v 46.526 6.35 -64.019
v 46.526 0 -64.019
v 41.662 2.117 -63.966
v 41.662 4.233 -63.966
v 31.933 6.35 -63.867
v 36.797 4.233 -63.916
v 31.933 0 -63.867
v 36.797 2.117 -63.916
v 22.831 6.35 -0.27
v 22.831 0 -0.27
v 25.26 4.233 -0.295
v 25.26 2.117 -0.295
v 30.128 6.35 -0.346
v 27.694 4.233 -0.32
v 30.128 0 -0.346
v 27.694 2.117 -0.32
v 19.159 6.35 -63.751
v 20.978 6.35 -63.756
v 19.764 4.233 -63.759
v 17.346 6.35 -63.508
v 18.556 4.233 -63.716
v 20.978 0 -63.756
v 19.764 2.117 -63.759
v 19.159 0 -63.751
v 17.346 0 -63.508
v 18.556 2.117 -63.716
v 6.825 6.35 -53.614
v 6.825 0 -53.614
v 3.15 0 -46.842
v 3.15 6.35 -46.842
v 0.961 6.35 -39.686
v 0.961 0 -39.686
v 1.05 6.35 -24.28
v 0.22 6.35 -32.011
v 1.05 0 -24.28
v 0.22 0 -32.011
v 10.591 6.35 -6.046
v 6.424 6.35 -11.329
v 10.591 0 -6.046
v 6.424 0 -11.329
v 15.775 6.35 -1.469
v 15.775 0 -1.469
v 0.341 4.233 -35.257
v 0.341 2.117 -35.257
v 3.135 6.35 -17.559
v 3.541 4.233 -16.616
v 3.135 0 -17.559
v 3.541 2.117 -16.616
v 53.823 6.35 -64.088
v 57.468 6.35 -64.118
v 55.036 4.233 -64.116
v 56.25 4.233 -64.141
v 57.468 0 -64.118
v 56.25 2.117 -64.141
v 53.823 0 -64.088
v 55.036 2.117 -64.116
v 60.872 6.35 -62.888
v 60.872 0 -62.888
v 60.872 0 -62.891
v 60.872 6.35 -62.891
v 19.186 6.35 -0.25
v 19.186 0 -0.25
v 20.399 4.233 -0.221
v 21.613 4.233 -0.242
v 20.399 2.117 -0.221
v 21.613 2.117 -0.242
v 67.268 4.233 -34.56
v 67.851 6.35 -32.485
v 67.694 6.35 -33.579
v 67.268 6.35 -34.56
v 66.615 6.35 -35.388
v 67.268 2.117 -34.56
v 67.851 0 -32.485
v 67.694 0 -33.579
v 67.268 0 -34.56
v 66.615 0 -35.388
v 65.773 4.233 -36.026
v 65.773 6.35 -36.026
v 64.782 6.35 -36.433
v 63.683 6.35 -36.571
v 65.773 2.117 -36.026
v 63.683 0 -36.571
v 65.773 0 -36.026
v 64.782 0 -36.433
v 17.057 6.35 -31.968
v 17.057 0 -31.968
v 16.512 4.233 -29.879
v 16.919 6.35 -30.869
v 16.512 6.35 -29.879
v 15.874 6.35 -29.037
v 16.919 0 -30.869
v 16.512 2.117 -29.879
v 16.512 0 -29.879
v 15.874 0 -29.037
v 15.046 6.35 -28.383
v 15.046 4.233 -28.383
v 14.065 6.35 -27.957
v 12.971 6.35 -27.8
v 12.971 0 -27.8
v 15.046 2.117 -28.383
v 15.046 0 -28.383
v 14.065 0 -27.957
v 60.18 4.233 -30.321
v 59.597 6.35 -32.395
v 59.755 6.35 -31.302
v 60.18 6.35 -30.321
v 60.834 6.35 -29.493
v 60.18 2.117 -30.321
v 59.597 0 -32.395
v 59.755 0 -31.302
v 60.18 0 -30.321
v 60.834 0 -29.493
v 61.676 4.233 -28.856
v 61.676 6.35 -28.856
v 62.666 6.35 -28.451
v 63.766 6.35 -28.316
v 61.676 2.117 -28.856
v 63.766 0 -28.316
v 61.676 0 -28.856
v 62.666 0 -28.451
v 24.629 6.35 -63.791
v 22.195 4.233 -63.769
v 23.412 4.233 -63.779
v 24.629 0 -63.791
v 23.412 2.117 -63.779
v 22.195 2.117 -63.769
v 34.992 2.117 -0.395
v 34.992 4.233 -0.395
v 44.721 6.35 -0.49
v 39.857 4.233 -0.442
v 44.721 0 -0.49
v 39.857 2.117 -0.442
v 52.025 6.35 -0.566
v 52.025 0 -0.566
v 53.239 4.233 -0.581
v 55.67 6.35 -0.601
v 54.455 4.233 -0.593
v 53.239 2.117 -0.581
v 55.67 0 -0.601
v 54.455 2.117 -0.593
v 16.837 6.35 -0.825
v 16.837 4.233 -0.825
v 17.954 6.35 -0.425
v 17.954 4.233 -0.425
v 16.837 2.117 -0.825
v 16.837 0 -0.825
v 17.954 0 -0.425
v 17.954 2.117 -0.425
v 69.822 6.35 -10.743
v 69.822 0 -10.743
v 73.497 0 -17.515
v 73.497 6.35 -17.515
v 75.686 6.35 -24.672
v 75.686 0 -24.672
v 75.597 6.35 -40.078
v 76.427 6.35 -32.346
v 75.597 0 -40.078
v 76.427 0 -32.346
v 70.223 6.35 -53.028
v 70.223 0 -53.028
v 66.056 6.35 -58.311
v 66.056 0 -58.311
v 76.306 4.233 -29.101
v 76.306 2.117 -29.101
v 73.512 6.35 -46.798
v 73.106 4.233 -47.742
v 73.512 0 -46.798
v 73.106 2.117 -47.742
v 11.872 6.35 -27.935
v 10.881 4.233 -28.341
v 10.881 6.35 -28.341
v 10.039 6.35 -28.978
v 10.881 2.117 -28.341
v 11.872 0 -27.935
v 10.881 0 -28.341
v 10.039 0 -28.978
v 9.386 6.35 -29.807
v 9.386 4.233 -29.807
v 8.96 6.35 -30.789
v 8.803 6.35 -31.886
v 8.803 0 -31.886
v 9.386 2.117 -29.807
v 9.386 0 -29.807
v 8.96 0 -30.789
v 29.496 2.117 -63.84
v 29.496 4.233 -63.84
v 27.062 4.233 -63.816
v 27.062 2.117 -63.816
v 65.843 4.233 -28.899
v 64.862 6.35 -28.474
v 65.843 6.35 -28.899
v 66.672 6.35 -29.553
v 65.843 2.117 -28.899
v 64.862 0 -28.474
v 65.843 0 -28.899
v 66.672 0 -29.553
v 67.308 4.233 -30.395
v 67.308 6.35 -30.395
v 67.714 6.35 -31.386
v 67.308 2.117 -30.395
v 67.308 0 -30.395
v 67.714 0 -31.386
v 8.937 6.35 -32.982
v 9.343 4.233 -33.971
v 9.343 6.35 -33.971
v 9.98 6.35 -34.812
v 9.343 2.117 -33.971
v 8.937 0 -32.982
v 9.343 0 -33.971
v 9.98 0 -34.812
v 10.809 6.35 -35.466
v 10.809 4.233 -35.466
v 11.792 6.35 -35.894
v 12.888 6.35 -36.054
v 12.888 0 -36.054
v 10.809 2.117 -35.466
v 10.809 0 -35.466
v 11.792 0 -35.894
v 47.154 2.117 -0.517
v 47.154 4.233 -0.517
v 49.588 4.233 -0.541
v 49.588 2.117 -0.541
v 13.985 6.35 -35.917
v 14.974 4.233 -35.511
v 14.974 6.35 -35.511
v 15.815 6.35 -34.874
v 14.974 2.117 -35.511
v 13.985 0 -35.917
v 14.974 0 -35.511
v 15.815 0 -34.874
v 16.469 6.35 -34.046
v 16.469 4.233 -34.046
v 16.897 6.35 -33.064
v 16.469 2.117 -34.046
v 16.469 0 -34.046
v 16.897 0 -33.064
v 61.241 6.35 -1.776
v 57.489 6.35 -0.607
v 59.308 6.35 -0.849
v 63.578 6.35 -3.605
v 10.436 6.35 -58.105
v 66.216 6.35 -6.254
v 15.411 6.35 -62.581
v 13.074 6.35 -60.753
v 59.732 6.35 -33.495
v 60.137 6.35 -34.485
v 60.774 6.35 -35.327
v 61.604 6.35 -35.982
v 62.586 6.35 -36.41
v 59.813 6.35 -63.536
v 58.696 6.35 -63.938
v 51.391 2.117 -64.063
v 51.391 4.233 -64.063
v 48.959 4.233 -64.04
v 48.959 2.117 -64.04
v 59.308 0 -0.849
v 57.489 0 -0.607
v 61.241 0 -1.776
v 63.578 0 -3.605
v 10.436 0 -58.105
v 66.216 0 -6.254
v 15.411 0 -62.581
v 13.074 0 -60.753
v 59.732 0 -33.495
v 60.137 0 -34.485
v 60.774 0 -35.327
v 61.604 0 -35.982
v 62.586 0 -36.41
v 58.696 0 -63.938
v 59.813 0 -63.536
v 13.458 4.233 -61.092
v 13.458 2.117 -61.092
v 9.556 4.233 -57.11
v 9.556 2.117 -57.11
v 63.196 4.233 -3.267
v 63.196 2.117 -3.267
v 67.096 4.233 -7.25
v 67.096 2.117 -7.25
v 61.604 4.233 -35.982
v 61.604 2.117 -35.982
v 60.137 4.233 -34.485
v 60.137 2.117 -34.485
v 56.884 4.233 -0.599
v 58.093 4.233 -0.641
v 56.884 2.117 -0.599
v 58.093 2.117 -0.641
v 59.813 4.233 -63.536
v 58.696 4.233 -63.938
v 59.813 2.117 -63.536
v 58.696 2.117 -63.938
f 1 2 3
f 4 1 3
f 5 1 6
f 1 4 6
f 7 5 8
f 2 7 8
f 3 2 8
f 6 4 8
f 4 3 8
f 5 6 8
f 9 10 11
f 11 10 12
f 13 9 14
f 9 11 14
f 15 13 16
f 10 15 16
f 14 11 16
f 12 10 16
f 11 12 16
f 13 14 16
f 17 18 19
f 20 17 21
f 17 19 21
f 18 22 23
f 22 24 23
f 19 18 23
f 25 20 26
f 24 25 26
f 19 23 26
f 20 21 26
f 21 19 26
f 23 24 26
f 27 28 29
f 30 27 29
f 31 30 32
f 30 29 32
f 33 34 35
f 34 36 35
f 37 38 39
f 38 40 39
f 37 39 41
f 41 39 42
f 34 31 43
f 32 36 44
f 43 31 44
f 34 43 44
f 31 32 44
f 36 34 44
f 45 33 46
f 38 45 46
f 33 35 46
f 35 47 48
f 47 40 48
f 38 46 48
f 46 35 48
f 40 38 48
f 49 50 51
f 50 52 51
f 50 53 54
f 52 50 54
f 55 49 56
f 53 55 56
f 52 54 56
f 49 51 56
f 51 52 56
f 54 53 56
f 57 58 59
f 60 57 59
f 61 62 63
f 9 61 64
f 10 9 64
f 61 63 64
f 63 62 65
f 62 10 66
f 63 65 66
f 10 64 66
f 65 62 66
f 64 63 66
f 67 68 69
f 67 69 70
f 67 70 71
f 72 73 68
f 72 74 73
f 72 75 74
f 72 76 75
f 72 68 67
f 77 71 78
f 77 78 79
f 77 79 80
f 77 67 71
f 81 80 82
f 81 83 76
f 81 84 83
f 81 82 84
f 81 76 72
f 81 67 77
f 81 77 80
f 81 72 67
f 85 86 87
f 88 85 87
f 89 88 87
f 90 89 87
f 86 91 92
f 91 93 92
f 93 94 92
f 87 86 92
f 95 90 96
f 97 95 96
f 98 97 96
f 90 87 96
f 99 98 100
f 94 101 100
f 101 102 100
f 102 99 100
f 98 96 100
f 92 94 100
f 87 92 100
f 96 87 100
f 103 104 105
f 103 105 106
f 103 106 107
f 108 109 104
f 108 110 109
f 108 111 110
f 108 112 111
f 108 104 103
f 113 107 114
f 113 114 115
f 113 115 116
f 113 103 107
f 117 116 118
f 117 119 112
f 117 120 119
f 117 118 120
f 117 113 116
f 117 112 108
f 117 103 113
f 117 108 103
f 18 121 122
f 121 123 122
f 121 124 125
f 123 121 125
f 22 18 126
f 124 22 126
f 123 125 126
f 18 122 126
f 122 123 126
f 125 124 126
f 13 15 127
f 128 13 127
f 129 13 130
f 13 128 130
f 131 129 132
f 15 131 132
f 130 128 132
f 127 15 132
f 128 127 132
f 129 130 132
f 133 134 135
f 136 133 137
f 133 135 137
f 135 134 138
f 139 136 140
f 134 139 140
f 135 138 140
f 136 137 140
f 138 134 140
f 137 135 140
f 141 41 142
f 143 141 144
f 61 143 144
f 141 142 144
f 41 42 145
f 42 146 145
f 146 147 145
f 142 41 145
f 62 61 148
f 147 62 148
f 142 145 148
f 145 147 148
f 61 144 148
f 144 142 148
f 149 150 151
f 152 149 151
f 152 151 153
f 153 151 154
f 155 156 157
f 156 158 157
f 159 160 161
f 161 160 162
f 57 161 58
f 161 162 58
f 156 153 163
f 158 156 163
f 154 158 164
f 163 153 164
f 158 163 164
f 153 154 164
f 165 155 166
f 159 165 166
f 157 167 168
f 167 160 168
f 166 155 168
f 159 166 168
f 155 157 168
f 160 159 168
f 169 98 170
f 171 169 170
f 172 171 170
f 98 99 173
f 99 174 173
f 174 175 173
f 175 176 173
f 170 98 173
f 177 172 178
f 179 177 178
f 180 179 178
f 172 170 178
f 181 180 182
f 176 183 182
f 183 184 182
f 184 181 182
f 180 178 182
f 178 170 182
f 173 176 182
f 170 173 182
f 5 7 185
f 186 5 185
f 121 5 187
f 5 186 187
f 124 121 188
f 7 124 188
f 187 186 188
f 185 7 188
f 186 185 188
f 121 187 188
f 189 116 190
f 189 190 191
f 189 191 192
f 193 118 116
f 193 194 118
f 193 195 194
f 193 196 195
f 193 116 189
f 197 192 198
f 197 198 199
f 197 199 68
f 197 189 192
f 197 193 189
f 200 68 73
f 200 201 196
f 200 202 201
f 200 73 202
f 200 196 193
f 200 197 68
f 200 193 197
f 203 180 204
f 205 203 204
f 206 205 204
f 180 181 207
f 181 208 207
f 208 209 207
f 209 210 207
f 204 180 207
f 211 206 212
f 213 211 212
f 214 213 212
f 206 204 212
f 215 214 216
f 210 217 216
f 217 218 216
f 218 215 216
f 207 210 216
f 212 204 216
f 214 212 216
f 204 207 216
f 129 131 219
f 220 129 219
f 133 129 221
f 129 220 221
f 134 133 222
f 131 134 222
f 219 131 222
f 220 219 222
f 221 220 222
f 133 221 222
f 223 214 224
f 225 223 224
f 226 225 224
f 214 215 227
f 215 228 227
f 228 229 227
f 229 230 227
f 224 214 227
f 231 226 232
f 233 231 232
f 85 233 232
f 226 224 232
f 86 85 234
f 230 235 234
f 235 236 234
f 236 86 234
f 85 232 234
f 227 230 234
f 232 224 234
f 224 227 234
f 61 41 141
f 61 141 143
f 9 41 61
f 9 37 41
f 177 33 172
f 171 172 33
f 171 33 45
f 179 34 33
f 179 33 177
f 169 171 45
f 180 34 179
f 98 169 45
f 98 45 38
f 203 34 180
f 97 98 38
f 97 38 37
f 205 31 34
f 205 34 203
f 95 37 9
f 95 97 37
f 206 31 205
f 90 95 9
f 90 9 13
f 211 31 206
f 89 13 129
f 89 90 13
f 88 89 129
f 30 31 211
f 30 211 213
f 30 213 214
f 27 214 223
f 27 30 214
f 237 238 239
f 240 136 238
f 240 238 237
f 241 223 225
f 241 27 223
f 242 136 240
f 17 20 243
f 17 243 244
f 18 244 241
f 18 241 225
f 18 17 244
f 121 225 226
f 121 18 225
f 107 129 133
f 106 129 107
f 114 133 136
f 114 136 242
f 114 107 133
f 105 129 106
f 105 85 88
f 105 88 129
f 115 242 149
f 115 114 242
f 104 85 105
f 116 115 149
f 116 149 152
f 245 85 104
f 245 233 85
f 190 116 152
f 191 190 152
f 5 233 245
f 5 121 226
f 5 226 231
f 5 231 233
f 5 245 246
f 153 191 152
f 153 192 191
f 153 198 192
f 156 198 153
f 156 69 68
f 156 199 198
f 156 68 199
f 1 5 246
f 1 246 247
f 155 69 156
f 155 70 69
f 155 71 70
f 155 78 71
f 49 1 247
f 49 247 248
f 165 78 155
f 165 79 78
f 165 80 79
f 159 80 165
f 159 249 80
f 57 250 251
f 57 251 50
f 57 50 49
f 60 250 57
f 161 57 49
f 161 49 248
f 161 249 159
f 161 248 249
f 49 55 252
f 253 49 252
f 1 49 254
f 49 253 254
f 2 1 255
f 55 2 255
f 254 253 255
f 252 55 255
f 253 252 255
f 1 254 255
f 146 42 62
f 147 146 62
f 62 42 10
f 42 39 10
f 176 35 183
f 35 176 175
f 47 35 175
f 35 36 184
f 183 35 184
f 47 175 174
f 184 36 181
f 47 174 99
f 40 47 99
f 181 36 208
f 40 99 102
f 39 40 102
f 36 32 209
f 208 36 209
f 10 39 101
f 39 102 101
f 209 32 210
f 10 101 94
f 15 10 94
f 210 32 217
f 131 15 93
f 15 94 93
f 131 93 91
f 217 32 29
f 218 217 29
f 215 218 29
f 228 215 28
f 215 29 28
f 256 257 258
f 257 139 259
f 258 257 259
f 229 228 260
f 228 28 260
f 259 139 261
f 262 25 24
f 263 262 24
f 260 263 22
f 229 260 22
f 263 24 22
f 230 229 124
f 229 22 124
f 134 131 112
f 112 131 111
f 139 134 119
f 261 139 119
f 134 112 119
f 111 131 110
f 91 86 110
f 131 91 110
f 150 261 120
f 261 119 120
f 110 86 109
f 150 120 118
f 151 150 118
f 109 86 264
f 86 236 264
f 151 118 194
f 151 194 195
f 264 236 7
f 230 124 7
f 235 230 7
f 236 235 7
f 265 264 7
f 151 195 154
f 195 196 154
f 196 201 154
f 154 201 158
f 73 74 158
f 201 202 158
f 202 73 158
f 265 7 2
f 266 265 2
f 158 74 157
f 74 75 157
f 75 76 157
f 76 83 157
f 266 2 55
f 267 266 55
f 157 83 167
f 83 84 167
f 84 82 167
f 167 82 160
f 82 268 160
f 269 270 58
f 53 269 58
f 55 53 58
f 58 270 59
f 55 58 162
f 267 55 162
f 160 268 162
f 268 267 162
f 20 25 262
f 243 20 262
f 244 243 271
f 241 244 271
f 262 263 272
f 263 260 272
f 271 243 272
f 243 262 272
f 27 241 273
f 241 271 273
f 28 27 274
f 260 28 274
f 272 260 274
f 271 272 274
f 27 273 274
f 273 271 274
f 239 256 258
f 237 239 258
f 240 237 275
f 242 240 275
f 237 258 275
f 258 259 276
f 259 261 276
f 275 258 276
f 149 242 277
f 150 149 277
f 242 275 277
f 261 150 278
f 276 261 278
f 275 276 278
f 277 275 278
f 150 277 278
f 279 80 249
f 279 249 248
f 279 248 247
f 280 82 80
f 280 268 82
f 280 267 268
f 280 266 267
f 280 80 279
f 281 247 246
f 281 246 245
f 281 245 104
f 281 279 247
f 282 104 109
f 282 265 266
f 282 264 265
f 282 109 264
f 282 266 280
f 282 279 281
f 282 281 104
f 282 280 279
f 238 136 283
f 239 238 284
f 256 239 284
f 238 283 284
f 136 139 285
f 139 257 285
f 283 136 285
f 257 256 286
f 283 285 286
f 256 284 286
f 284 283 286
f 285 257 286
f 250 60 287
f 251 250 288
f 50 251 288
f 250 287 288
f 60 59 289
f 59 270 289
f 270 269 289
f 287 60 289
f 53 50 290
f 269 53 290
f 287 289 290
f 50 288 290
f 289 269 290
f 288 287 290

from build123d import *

# Parameters (mm, degrees)
BOSS_EXTRUDE1_DEPTH = 6.35


with BuildPart() as part:
    # Sketch1 → Boss-Extrude1 (new body)
    with BuildSketch(Plane(origin=(0, 0, 0), x_dir=(1, 0, 0), z_dir=(0, 1, 0))):
        with BuildLine():
            Line((60.8717096, 62.8883934), (60.8717096, 62.8914922))
            add(Edge.make_bspline(
                [(60.8717096, 62.8914922), (59.8243914, 63.663195), (58.7701898, 64.0421376), (57.4679572, 64.1179312)],
                knots=[0, 0, 0, 0, 1, 1, 1, 1], degree=3))
            add(Edge.make_bspline(
                [(57.4679572, 64.1179312), (56.2483762, 64.1799326), (55.035704, 64.1029452), (53.8230318, 64.0879338)],
                knots=[0, 0, 0, 0, 1, 1, 1, 1], degree=3))
            add(Edge.make_bspline(
                [(53.8230318, 64.0879338), (51.390804, 64.0629402), (48.9585508, 64.0379212), (46.526323, 64.018922)],
                knots=[0, 0, 0, 0, 1, 1, 1, 1], degree=3))
            add(Edge.make_bspline(
                [(46.526323, 64.018922), (41.661842, 63.963931), (36.797361, 63.9154424), (31.9329054, 63.8674364)],
                knots=[0, 0, 0, 0, 1, 1, 1, 1], degree=3))
            add(Edge.make_bspline(
                [(31.9329054, 63.8674364), (29.4937688, 63.837439), (27.061541, 63.8174238), (24.6292878, 63.7914396)],
                knots=[0, 0, 0, 0, 1, 1, 1, 1], degree=3))
            add(Edge.make_bspline(
                [(24.6292878, 63.7914396), (23.4097322, 63.7764282), (22.19706, 63.7714244), (20.9775044, 63.7564384)],
                knots=[0, 0, 0, 0, 1, 1, 1, 1], degree=3))
            add(Edge.make_bspline(
                [(20.9775044, 63.7564384), (19.7579234, 63.741427), (18.5590434, 63.8389376), (17.3463712, 63.5084328)],
                knots=[0, 0, 0, 0, 1, 1, 1, 1], degree=3))
            add(Edge.make_bspline(
                [(17.3463712, 63.5084328), (13.8599164, 62.5575838), (8.5751416, 56.1841396), (6.8250308, 53.6141422)],
                knots=[0, 0, 0, 0, 1, 1, 1, 1], degree=3))
            add(Edge.make_bspline(
                [(6.8250308, 53.6141422), (-4.716018, 36.6573308), (-0.7610602, 13.6096756), (15.7754066, 1.469136)],
                knots=[0, 0, 0, 0, 1, 1, 1, 1], degree=3))
            add(Edge.make_bspline(
                [(15.7754066, 1.469136), (16.8296082, 0.6974332), (17.876901, 0.3184906), (19.1860424, 0.2495804)],
                knots=[0, 0, 0, 0, 1, 1, 1, 1], degree=3))
            add(Edge.make_bspline(
                [(19.1860424, 0.2495804), (20.3987146, 0.180594), (21.6113868, 0.2545842), (22.8309424, 0.2695956)],
                knots=[0, 0, 0, 0, 1, 1, 1, 1], degree=3))
            add(Edge.make_bspline(
                [(22.8309424, 0.2695956), (25.2563122, 0.2945892), (27.6954234, 0.3195828), (30.1276766, 0.3455924)],
                knots=[0, 0, 0, 0, 1, 1, 1, 1], degree=3))
            add(Edge.make_bspline(
                [(30.1276766, 0.3455924), (34.9921322, 0.3955796), (39.8566132, 0.442087), (44.7210942, 0.490093)],
                knots=[0, 0, 0, 0, 1, 1, 1, 1], degree=3))
            add(Edge.make_bspline(
                [(44.7210942, 0.490093), (47.153322, 0.5200904), (49.5855752, 0.5400802), (52.0246864, 0.5660898)],
                knots=[0, 0, 0, 0, 1, 1, 1, 1], degree=3))
            add(Edge.make_bspline(
                [(52.0246864, 0.5660898), (53.2373586, 0.5810758), (54.4569396, 0.5960872), (55.6696118, 0.601091)],
                knots=[0, 0, 0, 0, 1, 1, 1, 1], degree=3))
            add(Edge.make_bspline(
                [(55.6696118, 0.601091), (56.8891674, 0.616077), (58.0880474, 0.5185918), (59.3076284, 0.8490712)],
                knots=[0, 0, 0, 0, 1, 1, 1, 1], degree=3))
            add(Edge.make_bspline(
                [(59.3076284, 0.8490712), (62.7940578, 1.7999456), (68.0788326, 8.1802732), (69.8220346, 10.7433872)],
                knots=[0, 0, 0, 0, 1, 1, 1, 1], degree=3))
            add(Edge.make_bspline(
                [(69.8220346, 10.7433872), (81.3631088, 27.7001732), (77.408151, 50.7478792), (60.8717096, 62.8883934)],
                knots=[0, 0, 0, 0, 1, 1, 1, 1], degree=3))
        make_face()
        with BuildLine():
            add(Edge.make_bspline(
                [(59.5970106, 32.3954902), (59.6175084, 30.121733), (61.4849164, 28.2889452), (63.7655824, 28.3164788)],
                knots=[0, 0, 0, 0, 1, 1, 1, 1], degree=3))
            add(Edge.make_bspline(
                [(63.7655824, 28.3164788), (66.046223, 28.336494), (67.8721274, 30.2043846), (67.8514772, 32.485076)],
                knots=[0, 0, 0, 0, 1, 1, 1, 1], degree=3))
            add(Edge.make_bspline(
                [(67.8514772, 32.485076), (67.830954, 34.7588332), (65.963546, 36.591621), (63.6829054, 36.5709454)],
                knots=[0, 0, 0, 0, 1, 1, 1, 1], degree=3))
            add(Edge.make_bspline(
                [(63.6829054, 36.5709454), (61.4022394, 36.5409226), (59.5694516, 34.6761308), (59.5970106, 32.3954902)],
                knots=[0, 0, 0, 0, 1, 1, 1, 1], degree=3))
        make_face(mode=Mode.SUBTRACT)
        with BuildLine():
            add(Edge.make_bspline(
                [(17.0569636, 31.9682876), (17.0776138, 29.6876216), (15.2448514, 27.8203914), (12.9710942, 27.7997412)],
                knots=[0, 0, 0, 0, 1, 1, 1, 1], degree=3))
            add(Edge.make_bspline(
                [(12.9710942, 27.7997412), (10.6904282, 27.7747222), (8.823198, 29.6049954), (8.8025224, 31.885636)],
                knots=[0, 0, 0, 0, 1, 1, 1, 1], degree=3))
            add(Edge.make_bspline(
                [(8.8025224, 31.885636), (8.7749634, 34.1593932), (10.6077512, 36.0266234), (12.8884172, 36.0541824)],
                knots=[0, 0, 0, 0, 1, 1, 1, 1], degree=3))
            add(Edge.make_bspline(
                [(12.8884172, 36.0541824), (15.1621744, 36.0741722), (17.0294046, 34.2489282), (17.0569636, 31.9682876)],
                knots=[0, 0, 0, 0, 1, 1, 1, 1], degree=3))
        make_face(mode=Mode.SUBTRACT)
    extrude(amount=BOSS_EXTRUDE1_DEPTH)


solid = part.part
